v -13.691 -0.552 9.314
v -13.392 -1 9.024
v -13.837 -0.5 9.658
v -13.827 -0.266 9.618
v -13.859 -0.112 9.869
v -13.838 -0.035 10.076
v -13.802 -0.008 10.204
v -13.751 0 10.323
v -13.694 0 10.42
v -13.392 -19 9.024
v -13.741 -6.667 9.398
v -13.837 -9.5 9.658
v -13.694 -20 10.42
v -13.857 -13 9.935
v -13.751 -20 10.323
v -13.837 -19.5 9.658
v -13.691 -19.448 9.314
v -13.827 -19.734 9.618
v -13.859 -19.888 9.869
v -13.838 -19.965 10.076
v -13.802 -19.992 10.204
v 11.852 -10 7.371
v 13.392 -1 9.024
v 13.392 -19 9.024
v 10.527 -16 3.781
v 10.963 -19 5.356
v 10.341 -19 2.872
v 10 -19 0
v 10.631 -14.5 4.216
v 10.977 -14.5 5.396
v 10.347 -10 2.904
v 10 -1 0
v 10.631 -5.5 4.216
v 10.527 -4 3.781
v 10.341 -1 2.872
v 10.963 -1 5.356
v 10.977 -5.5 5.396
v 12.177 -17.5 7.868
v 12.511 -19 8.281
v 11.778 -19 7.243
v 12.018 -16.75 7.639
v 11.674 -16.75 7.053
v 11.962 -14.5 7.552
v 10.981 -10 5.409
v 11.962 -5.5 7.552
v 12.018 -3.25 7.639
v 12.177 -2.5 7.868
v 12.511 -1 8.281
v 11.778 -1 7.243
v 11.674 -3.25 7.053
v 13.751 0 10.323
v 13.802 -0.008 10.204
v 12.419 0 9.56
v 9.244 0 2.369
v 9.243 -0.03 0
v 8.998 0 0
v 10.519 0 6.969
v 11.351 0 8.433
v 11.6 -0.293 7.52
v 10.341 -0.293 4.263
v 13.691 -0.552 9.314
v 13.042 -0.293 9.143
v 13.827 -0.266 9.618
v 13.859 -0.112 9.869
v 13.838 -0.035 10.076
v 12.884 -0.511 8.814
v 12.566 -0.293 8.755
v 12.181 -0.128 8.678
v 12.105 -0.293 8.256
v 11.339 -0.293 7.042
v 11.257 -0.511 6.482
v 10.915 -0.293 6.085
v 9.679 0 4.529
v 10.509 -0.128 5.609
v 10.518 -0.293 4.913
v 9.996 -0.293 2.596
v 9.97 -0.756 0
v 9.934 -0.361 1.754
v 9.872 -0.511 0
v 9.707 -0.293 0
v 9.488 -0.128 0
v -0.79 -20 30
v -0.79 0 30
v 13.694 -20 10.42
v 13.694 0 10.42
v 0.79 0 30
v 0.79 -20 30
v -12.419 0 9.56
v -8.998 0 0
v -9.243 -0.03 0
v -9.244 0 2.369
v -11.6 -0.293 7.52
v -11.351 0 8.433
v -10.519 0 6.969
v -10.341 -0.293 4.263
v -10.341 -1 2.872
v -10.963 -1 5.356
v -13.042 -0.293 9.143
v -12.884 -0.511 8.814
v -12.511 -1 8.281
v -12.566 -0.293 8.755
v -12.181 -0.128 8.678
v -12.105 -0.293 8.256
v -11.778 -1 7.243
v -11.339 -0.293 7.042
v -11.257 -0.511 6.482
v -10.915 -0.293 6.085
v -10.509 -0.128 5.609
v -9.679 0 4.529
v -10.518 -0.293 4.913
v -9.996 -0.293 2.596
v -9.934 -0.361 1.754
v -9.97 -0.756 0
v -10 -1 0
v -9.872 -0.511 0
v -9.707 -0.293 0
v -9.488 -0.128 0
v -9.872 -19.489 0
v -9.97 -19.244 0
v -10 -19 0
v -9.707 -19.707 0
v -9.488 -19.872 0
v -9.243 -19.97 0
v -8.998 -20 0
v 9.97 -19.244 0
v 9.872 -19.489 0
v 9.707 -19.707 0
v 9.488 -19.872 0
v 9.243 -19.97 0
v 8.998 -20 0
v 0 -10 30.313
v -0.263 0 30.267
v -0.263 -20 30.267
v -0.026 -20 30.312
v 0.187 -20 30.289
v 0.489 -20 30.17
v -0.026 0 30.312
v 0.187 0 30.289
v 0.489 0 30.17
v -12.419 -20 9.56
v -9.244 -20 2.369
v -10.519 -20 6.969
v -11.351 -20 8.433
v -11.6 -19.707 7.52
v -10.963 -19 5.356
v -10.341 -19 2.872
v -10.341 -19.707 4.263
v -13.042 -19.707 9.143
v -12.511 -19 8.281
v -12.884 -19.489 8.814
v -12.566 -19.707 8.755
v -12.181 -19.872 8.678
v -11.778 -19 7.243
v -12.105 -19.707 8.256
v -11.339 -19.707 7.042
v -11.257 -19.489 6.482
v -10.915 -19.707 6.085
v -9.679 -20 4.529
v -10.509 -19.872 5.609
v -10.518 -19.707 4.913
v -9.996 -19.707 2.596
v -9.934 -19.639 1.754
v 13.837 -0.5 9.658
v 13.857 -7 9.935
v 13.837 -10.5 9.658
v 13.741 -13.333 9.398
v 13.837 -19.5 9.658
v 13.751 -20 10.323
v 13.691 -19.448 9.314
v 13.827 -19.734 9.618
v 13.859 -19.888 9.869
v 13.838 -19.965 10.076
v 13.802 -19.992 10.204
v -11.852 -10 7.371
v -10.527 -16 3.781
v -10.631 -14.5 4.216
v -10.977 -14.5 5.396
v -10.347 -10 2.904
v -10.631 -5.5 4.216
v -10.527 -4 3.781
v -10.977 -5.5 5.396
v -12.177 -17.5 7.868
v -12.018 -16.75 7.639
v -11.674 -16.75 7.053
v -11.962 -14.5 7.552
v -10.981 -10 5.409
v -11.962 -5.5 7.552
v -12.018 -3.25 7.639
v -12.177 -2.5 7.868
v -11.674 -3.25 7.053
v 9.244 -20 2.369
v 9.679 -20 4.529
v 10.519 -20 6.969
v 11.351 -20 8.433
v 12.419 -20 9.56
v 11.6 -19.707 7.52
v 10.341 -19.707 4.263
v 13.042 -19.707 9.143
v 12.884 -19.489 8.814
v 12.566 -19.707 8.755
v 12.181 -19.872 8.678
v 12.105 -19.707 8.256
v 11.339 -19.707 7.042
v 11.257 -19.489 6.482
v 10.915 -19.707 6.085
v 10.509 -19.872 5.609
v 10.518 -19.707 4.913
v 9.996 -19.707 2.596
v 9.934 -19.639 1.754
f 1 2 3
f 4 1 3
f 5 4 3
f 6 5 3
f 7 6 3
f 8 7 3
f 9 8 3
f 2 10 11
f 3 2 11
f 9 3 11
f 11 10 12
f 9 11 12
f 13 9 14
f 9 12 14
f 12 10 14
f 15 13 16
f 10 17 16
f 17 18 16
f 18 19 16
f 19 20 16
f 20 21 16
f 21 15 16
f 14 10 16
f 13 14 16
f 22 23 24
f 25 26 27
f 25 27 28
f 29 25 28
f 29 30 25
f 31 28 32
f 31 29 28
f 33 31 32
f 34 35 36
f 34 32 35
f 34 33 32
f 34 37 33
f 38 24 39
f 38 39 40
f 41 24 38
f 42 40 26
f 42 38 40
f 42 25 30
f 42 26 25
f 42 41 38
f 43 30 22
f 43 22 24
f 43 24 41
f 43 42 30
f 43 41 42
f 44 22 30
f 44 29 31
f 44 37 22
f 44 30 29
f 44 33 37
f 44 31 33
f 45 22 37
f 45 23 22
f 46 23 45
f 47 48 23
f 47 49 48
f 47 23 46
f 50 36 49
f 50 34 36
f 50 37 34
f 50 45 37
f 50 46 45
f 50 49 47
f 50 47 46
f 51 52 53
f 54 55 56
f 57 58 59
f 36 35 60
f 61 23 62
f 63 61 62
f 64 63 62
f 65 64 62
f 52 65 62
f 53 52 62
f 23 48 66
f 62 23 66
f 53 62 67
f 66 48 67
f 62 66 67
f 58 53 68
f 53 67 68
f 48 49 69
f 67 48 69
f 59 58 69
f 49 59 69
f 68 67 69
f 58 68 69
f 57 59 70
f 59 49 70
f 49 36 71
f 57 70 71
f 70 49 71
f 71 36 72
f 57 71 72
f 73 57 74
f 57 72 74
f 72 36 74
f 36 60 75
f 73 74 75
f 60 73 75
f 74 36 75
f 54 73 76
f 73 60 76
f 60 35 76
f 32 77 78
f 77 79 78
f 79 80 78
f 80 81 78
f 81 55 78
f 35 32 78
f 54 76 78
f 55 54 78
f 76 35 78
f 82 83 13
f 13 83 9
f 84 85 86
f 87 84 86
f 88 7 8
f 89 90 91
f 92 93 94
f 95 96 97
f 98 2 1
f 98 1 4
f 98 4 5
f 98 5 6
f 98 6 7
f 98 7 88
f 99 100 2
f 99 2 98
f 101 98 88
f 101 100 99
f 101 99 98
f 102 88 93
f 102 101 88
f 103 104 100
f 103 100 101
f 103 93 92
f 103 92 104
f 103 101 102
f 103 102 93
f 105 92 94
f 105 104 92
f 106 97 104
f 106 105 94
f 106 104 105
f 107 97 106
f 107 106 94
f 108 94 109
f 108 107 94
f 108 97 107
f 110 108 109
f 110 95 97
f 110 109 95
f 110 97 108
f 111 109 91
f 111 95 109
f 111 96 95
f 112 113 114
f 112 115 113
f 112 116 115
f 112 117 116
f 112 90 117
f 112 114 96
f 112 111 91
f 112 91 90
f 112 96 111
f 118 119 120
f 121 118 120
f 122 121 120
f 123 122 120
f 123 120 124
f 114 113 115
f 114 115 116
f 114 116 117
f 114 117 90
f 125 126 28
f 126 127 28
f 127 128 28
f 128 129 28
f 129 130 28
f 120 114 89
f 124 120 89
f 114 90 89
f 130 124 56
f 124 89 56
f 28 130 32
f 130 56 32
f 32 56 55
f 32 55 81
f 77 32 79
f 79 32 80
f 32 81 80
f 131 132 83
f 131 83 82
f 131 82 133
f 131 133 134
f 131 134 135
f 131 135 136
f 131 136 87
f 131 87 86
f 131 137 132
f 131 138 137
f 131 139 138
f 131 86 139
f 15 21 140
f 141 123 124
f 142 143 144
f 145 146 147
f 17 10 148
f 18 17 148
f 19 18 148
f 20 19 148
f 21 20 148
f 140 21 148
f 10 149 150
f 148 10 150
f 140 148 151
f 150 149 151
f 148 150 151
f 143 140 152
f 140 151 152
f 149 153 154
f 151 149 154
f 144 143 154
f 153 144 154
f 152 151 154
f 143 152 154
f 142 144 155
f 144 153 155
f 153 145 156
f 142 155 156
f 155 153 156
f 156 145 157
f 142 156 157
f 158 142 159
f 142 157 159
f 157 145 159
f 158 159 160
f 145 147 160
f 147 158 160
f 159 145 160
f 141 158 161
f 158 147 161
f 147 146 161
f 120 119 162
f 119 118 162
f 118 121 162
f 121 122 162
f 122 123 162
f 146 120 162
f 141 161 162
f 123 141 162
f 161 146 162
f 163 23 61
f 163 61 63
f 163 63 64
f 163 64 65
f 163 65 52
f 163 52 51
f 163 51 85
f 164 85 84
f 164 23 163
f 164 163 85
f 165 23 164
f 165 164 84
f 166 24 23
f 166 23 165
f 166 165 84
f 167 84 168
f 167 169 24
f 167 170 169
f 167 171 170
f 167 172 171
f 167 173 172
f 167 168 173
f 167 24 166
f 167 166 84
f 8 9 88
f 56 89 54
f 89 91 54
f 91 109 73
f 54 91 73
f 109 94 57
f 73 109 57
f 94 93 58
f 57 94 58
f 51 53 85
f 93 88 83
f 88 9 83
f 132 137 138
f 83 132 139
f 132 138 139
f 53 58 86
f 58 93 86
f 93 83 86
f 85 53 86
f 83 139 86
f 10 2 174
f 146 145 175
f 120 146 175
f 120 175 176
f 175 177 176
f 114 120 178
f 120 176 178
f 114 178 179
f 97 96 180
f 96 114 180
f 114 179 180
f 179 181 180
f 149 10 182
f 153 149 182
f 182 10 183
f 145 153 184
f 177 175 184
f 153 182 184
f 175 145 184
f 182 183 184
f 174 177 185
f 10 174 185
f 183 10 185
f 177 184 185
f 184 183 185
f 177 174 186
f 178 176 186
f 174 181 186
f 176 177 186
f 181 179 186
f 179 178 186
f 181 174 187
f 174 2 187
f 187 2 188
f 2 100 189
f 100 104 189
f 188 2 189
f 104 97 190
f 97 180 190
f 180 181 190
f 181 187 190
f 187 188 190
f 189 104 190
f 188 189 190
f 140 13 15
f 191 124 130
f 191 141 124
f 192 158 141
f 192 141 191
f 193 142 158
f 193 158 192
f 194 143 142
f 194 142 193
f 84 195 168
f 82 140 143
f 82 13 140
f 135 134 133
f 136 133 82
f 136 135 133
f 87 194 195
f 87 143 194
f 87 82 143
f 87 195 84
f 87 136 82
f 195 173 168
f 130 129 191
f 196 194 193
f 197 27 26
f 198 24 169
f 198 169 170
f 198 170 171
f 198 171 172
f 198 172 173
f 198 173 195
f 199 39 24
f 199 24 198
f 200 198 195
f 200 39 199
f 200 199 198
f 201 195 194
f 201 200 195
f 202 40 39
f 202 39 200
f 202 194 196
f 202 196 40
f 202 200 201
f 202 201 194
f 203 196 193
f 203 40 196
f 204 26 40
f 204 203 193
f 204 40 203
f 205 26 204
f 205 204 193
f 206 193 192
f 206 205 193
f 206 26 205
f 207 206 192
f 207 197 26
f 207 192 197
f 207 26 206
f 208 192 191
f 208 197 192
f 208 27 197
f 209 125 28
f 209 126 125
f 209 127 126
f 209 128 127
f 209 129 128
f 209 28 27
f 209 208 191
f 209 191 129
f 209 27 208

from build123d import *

# Parameters (mm, degrees)
F1_DEPTH = 20
F2_R     = 1


# Not quite as in the source:
# - a feature names something its author has since deleted; it is built from what else it names


with BuildPart() as f1:
    # F0 (on Front) → F1 (new body)
    with BuildSketch(Plane.XZ):
        with BuildLine():
            add(Edge.make_bspline(
                [(-14.320673421, 9.4697382301), (-13.2394510975, 9.0805694331), (-11.3333298848, 7.4710466695), (-10.1861008598, 3.0568630532), (-10, 0)],
                knots=[0, 0, 0, 0, 0.3950023229, 1, 1, 1, 1], degree=3))
            Line((-10, 0), (0, 0))
            Line((0, 0), (10, 0))
            add(Edge.make_bspline(
                [(14.320673421, 9.4697382301), (13.2394510975, 9.0805694331), (11.3333298848, 7.4710466695), (10.1861008598, 3.0568630532), (10, 0)],
                knots=[0, 0, 0, 0, 0.3950023229, 1, 1, 1, 1], degree=3))
            Line((14.320673421, 9.4697382301), (0.7904520571, 30))
            add(Edge.make_bspline(
                [(-0.7904520571, 30), (-0.5269680381, 30.1565037668), (0, 30.4695113003), (0.5269680381, 30.1565037668), (0.7904520571, 30)],
                knots=[0, 0, 0, 0, 0.5, 1, 1, 1, 1], degree=3))
            Line((-0.7904520571, 30), (-14.320673421, 9.4697382301))
        make_face()
    extrude(amount=F1_DEPTH)

    # F2
    f2_edges = [f1.edges().sort_by_distance(p)[0] for p in [
        (-14.320673, -10, 9.469738),
        (14.320673, -10, 9.469738),
        (-10.973556, 0, 5.385962),
        (-10.973556, -20, 5.385962),
        (10.973556, 0, 5.385962),
        (10.973556, -20, 5.385962),
    ]]
    fillet(f2_edges, radius=F2_R)


solid = f1.part
